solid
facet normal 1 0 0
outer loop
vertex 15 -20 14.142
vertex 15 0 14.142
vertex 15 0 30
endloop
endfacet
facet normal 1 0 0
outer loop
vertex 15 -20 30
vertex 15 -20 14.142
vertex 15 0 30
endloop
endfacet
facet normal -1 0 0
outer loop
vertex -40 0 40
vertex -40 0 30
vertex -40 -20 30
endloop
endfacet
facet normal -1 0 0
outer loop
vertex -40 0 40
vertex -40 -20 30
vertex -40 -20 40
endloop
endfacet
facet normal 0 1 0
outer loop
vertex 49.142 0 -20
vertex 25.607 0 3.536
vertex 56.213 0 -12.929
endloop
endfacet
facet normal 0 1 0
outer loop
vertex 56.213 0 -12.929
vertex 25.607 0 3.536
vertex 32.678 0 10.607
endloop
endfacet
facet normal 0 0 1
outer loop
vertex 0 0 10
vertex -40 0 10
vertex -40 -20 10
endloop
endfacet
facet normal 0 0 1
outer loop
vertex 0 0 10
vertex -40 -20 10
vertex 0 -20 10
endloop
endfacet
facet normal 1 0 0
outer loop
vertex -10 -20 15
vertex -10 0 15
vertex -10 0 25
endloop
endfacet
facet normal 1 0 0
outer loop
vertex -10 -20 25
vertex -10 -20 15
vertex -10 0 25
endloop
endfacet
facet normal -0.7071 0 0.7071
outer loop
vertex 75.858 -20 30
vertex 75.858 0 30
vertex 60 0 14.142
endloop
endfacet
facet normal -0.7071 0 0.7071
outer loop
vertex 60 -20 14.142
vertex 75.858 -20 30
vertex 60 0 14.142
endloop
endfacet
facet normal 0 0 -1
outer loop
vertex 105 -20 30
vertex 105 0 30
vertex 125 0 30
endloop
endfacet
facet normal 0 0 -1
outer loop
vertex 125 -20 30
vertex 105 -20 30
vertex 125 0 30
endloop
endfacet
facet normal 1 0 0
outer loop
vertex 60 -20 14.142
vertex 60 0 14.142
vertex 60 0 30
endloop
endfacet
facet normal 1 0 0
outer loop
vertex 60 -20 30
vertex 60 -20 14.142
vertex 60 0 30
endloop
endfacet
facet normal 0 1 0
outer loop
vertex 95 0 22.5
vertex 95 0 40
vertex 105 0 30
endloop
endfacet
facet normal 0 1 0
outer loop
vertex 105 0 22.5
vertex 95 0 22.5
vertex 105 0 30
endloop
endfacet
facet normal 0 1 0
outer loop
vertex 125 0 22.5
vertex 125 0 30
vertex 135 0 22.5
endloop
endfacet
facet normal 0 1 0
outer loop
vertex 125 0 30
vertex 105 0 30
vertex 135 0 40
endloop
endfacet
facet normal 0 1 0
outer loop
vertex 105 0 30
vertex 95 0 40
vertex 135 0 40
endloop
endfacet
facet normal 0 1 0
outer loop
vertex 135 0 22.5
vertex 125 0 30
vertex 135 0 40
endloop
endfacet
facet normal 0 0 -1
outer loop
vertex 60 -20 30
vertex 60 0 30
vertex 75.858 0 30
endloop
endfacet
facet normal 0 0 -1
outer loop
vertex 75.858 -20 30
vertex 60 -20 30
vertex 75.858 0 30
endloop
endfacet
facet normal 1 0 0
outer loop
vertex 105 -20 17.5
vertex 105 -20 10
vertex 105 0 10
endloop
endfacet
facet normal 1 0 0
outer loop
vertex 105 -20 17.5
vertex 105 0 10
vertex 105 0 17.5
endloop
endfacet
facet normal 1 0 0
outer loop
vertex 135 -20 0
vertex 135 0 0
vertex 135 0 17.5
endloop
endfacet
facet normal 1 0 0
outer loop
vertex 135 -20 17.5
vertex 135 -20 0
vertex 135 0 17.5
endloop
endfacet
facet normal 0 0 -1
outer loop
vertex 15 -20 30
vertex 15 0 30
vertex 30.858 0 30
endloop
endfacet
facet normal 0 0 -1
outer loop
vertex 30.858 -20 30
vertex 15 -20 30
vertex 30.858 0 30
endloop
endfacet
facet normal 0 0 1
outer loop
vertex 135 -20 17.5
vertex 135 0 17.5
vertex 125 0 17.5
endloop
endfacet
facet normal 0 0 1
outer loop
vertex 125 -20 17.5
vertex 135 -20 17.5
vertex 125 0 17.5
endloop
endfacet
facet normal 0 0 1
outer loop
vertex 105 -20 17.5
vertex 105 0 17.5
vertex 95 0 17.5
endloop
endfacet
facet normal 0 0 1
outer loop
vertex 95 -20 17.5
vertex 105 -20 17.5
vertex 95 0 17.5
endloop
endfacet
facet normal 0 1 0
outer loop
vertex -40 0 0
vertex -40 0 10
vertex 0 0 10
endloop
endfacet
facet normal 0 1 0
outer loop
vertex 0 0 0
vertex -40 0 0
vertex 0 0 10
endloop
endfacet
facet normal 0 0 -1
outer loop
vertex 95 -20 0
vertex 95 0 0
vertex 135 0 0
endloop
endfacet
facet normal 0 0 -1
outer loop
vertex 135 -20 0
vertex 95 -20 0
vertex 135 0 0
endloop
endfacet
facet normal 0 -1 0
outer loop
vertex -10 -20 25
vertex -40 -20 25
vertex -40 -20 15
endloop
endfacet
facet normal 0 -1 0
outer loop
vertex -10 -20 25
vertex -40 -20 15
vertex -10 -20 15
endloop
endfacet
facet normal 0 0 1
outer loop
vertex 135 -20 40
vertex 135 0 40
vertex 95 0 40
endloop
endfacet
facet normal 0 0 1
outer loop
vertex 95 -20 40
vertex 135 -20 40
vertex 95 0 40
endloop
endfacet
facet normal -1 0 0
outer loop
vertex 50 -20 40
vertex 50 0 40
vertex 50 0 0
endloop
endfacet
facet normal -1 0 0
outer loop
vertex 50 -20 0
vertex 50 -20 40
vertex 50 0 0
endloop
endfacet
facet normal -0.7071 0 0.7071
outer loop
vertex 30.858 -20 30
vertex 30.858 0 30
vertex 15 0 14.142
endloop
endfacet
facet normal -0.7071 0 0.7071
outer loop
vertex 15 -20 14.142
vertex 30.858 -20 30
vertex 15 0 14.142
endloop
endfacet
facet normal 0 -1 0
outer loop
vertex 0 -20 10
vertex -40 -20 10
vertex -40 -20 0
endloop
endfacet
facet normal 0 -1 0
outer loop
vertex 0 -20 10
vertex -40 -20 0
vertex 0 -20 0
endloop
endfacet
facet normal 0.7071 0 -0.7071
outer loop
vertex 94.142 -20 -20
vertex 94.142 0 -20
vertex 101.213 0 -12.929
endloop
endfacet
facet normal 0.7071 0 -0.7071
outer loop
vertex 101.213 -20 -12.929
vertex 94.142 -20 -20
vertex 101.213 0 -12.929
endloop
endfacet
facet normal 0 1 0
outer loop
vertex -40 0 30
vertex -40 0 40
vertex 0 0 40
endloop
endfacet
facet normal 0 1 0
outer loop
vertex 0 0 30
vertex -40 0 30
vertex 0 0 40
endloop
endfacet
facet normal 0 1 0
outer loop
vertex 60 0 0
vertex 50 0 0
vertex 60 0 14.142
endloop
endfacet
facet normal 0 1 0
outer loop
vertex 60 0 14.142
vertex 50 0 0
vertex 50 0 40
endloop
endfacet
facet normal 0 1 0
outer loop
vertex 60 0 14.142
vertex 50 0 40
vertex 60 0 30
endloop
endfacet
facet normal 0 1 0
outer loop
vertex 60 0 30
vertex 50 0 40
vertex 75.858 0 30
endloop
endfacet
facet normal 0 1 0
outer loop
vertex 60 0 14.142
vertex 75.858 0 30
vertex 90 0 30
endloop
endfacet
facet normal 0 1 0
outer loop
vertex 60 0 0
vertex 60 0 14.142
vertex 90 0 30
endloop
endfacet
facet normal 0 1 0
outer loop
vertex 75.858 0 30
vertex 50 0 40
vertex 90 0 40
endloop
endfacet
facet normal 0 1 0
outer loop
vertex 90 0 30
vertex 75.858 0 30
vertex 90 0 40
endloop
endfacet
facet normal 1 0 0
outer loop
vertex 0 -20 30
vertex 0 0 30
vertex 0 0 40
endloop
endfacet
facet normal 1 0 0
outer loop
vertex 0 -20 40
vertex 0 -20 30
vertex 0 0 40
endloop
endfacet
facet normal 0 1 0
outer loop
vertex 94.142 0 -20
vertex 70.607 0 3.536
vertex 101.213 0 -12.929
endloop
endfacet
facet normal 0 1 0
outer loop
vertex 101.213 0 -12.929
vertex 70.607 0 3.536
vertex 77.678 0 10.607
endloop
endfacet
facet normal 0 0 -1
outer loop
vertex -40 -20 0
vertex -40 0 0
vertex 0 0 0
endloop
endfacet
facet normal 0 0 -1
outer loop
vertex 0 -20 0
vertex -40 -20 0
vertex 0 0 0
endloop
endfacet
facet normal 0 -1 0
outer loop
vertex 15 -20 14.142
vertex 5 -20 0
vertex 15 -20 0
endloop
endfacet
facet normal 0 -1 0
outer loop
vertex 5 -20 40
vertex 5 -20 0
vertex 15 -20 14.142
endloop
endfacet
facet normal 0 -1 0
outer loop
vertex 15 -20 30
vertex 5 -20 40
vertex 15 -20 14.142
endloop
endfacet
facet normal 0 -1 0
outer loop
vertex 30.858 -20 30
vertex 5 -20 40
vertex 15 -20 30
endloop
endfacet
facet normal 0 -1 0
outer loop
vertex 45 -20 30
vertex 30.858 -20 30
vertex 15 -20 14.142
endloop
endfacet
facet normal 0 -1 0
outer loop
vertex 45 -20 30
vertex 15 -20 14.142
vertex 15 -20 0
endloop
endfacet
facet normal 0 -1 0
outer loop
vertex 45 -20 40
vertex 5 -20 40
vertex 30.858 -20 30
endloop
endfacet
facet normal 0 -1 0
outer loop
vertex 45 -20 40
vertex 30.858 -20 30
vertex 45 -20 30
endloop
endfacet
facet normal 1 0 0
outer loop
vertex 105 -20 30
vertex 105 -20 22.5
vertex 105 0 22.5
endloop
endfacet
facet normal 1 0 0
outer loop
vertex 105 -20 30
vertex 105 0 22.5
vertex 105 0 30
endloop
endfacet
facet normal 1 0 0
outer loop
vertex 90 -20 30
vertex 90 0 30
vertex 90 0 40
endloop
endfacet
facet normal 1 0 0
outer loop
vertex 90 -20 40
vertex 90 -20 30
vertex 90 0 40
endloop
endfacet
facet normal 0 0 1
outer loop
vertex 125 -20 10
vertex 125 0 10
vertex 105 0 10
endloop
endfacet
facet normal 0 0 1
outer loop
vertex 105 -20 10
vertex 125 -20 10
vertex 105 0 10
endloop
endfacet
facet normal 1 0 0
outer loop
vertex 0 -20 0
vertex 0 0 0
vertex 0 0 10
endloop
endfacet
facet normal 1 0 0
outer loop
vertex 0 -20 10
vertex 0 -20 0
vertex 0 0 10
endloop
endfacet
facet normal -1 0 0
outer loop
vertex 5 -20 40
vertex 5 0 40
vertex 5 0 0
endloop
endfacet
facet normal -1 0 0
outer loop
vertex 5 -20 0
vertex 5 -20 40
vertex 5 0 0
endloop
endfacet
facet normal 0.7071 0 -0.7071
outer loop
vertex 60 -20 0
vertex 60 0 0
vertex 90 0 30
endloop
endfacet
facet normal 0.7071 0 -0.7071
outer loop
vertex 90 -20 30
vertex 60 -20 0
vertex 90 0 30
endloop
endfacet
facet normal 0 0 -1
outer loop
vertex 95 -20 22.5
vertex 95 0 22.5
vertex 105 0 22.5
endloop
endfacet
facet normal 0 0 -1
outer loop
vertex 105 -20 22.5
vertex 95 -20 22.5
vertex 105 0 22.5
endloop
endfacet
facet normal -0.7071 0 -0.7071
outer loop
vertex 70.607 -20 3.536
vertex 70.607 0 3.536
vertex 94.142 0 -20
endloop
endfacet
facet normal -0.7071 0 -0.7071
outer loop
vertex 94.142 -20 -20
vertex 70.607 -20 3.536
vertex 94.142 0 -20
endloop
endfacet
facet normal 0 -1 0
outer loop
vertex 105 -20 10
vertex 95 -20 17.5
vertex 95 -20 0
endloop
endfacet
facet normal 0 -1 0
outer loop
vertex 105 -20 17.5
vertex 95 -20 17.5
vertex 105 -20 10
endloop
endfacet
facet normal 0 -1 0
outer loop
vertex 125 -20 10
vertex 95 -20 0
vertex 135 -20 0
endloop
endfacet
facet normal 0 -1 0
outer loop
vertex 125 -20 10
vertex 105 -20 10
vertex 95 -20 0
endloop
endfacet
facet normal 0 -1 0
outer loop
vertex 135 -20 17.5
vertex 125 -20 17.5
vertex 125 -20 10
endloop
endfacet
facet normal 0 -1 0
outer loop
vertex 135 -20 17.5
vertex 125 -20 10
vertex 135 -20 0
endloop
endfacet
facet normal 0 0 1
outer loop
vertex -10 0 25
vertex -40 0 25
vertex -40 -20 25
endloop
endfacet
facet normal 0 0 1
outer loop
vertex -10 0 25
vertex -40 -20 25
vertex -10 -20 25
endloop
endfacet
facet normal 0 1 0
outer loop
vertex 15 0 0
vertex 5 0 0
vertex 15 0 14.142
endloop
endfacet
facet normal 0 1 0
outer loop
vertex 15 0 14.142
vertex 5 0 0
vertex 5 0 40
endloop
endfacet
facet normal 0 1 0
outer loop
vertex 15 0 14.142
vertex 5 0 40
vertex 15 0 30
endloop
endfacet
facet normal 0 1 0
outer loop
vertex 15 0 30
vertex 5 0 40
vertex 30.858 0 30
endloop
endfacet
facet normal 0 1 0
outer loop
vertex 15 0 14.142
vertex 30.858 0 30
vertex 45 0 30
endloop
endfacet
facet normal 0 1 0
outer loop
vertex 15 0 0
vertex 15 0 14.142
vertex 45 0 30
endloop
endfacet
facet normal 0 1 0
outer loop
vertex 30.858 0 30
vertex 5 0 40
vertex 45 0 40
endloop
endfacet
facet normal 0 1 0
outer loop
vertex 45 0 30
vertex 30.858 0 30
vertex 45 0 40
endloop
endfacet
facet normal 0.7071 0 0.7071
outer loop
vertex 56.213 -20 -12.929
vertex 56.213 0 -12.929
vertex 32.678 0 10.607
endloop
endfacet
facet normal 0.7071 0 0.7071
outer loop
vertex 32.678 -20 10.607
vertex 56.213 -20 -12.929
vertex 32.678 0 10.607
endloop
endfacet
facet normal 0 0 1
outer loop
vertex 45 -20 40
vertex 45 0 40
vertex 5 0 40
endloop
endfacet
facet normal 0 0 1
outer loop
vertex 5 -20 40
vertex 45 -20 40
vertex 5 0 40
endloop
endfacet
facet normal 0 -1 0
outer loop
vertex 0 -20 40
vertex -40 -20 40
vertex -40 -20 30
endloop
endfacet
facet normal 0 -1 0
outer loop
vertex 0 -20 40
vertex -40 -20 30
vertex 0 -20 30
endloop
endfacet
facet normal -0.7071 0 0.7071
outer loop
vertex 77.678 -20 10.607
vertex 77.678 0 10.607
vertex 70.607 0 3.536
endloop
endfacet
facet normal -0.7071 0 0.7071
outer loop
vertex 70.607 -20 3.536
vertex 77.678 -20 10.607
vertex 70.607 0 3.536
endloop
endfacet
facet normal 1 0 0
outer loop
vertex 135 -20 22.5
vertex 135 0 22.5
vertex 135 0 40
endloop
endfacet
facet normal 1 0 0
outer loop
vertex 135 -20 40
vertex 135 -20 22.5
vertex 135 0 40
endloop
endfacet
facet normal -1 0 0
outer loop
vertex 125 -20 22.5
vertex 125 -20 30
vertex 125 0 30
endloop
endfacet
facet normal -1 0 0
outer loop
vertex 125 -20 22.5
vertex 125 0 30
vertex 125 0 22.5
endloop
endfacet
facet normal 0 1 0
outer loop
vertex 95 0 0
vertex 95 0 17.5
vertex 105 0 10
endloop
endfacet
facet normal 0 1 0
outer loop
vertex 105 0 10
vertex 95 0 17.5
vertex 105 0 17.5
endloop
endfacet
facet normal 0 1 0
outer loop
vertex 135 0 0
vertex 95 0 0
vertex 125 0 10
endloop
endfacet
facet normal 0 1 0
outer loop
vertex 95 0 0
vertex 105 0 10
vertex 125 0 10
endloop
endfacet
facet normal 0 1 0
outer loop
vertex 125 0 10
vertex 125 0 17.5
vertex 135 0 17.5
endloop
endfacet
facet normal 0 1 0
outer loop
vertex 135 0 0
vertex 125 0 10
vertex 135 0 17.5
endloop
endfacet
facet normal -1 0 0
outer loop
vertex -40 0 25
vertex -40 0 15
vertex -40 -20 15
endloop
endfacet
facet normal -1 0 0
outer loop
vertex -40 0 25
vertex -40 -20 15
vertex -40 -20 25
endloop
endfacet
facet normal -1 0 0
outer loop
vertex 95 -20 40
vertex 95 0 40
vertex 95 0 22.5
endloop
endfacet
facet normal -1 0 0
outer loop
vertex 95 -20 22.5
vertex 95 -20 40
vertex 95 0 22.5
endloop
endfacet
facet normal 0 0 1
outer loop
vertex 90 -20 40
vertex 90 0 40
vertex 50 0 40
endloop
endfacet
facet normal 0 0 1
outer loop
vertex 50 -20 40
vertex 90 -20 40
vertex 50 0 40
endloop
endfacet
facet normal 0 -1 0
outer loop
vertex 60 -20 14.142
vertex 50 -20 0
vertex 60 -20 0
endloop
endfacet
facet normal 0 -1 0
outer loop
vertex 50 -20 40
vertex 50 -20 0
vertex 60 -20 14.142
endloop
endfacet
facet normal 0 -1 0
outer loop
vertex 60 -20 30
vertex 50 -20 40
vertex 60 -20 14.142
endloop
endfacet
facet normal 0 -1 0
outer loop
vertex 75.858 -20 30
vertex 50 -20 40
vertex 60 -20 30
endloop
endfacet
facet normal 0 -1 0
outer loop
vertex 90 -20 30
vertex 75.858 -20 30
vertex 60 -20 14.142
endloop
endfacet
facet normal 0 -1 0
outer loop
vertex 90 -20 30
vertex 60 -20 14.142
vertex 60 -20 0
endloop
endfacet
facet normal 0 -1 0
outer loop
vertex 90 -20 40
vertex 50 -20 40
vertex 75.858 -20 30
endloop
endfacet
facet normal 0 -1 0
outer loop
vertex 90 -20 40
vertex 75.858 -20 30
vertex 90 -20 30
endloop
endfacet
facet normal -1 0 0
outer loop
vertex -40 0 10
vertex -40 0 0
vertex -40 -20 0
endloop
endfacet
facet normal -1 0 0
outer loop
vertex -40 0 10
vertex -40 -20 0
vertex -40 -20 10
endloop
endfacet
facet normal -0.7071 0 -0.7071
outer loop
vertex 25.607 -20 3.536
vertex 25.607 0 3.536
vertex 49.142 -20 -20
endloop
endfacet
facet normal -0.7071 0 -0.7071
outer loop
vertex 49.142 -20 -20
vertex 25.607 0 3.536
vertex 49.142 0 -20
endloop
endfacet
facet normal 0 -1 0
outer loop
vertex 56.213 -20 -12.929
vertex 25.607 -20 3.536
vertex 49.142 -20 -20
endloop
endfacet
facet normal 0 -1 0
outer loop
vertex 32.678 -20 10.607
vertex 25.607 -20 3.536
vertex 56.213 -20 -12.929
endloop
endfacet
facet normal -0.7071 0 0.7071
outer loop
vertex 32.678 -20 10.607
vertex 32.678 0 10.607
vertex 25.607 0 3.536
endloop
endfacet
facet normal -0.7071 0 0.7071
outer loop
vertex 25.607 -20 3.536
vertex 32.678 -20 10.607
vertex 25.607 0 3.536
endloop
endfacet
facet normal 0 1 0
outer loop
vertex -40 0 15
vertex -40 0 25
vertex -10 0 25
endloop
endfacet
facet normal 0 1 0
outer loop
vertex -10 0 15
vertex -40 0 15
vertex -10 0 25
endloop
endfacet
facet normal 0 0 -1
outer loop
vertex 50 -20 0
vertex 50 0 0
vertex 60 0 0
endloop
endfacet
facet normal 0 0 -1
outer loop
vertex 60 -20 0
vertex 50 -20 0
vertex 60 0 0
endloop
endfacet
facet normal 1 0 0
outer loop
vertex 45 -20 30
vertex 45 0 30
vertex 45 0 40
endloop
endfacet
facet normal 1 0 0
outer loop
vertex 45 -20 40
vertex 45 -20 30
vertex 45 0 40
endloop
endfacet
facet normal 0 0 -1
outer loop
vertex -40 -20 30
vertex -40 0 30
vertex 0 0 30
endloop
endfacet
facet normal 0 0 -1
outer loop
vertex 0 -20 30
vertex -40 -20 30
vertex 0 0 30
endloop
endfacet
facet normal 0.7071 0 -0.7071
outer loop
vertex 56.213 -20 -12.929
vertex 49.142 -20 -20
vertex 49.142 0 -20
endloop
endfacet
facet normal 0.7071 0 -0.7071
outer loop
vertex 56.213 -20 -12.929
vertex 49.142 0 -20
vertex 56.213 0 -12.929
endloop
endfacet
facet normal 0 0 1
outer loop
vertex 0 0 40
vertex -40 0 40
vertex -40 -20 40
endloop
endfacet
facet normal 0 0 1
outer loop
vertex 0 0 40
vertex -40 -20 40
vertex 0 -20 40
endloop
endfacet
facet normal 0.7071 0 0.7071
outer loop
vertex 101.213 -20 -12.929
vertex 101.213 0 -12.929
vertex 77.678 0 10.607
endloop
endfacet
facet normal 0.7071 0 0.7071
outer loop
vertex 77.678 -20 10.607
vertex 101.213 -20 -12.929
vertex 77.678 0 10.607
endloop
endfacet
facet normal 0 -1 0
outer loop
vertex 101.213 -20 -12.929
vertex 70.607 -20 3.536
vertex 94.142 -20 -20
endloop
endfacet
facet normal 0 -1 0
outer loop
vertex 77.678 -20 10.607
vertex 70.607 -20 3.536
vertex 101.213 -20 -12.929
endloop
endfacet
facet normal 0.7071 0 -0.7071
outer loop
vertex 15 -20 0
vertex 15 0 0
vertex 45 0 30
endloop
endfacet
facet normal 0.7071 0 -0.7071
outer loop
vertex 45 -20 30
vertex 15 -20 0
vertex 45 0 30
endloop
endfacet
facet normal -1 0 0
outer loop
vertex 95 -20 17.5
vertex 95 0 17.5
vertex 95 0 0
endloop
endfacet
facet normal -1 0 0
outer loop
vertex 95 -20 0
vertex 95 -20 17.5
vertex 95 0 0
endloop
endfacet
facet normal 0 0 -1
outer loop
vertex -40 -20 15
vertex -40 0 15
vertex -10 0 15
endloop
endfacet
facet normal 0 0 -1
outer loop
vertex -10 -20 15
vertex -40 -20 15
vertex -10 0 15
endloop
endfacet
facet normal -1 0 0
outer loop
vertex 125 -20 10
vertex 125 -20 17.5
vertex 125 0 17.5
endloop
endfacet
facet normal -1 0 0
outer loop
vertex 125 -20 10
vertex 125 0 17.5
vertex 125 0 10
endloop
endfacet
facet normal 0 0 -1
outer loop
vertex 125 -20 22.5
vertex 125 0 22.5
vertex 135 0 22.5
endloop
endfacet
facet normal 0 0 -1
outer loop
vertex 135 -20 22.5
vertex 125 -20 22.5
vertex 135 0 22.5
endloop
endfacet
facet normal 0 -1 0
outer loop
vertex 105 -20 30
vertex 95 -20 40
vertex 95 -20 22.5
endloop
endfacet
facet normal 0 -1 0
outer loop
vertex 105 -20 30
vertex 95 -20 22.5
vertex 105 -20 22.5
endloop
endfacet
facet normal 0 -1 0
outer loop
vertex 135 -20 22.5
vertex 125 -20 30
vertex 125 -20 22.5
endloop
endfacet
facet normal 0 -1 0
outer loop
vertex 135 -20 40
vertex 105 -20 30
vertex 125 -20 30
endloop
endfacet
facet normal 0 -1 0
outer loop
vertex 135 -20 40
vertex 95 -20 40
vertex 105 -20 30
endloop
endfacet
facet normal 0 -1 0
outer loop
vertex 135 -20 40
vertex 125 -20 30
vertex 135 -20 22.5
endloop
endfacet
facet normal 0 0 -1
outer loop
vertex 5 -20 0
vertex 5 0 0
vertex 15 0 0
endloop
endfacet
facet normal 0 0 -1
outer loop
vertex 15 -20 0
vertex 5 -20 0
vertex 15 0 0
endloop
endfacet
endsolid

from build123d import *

# Parameters (mm, degrees)
F0_W     = 30
F0_H     = 10
F0_W_2   = 40
F1_DEPTH = 20


with BuildPart() as f1:
    # F0 (on Front) → F1 (new body)
    with BuildSketch(Plane.XZ):
        with Locations((-25, 20)):
            Rectangle(F0_W, F0_H)
        with Locations((-20, 35)):
            Rectangle(F0_W_2, F0_H)
        with Locations((-20, 5)):
            Rectangle(F0_W_2, F0_H)
        Polygon((5, 40), (5, 0), (15, 0), (22.071068, 7.071068), (29.142136, 14.142136), (45, 30), (45, 40), align=None)
        Polygon((15, 14.142136), (15, 30), (30.857864, 30), align=None, mode=Mode.SUBTRACT)
        Polygon((32.67767, 10.606602), (25.606602, 3.535534), (49.142136, -20), (56.213203, -12.928932), align=None)
        Polygon((77.67767, 10.606602), (70.606602, 3.535534), (94.142136, -20), (101.213203, -12.928932), align=None)
        Polygon((50, 40), (50, 0), (60, 0), (67.071068, 7.071068), (74.142136, 14.142136), (90, 30), (90, 40), align=None)
        Polygon((60, 14.142136), (60, 30), (75.857864, 30), align=None, mode=Mode.SUBTRACT)
        Polygon((135, 40), (95, 40), (95, 22.5), (105, 22.5), (105, 30), (125, 30), (125, 22.5), (135, 22.5), align=None)
        Polygon((95, 17.5), (95, 0), (135, 0), (135, 17.5), (125, 17.5), (125, 10), (105, 10), (105, 17.5), align=None)
    extrude(amount=F1_DEPTH)


solid = f1.part
